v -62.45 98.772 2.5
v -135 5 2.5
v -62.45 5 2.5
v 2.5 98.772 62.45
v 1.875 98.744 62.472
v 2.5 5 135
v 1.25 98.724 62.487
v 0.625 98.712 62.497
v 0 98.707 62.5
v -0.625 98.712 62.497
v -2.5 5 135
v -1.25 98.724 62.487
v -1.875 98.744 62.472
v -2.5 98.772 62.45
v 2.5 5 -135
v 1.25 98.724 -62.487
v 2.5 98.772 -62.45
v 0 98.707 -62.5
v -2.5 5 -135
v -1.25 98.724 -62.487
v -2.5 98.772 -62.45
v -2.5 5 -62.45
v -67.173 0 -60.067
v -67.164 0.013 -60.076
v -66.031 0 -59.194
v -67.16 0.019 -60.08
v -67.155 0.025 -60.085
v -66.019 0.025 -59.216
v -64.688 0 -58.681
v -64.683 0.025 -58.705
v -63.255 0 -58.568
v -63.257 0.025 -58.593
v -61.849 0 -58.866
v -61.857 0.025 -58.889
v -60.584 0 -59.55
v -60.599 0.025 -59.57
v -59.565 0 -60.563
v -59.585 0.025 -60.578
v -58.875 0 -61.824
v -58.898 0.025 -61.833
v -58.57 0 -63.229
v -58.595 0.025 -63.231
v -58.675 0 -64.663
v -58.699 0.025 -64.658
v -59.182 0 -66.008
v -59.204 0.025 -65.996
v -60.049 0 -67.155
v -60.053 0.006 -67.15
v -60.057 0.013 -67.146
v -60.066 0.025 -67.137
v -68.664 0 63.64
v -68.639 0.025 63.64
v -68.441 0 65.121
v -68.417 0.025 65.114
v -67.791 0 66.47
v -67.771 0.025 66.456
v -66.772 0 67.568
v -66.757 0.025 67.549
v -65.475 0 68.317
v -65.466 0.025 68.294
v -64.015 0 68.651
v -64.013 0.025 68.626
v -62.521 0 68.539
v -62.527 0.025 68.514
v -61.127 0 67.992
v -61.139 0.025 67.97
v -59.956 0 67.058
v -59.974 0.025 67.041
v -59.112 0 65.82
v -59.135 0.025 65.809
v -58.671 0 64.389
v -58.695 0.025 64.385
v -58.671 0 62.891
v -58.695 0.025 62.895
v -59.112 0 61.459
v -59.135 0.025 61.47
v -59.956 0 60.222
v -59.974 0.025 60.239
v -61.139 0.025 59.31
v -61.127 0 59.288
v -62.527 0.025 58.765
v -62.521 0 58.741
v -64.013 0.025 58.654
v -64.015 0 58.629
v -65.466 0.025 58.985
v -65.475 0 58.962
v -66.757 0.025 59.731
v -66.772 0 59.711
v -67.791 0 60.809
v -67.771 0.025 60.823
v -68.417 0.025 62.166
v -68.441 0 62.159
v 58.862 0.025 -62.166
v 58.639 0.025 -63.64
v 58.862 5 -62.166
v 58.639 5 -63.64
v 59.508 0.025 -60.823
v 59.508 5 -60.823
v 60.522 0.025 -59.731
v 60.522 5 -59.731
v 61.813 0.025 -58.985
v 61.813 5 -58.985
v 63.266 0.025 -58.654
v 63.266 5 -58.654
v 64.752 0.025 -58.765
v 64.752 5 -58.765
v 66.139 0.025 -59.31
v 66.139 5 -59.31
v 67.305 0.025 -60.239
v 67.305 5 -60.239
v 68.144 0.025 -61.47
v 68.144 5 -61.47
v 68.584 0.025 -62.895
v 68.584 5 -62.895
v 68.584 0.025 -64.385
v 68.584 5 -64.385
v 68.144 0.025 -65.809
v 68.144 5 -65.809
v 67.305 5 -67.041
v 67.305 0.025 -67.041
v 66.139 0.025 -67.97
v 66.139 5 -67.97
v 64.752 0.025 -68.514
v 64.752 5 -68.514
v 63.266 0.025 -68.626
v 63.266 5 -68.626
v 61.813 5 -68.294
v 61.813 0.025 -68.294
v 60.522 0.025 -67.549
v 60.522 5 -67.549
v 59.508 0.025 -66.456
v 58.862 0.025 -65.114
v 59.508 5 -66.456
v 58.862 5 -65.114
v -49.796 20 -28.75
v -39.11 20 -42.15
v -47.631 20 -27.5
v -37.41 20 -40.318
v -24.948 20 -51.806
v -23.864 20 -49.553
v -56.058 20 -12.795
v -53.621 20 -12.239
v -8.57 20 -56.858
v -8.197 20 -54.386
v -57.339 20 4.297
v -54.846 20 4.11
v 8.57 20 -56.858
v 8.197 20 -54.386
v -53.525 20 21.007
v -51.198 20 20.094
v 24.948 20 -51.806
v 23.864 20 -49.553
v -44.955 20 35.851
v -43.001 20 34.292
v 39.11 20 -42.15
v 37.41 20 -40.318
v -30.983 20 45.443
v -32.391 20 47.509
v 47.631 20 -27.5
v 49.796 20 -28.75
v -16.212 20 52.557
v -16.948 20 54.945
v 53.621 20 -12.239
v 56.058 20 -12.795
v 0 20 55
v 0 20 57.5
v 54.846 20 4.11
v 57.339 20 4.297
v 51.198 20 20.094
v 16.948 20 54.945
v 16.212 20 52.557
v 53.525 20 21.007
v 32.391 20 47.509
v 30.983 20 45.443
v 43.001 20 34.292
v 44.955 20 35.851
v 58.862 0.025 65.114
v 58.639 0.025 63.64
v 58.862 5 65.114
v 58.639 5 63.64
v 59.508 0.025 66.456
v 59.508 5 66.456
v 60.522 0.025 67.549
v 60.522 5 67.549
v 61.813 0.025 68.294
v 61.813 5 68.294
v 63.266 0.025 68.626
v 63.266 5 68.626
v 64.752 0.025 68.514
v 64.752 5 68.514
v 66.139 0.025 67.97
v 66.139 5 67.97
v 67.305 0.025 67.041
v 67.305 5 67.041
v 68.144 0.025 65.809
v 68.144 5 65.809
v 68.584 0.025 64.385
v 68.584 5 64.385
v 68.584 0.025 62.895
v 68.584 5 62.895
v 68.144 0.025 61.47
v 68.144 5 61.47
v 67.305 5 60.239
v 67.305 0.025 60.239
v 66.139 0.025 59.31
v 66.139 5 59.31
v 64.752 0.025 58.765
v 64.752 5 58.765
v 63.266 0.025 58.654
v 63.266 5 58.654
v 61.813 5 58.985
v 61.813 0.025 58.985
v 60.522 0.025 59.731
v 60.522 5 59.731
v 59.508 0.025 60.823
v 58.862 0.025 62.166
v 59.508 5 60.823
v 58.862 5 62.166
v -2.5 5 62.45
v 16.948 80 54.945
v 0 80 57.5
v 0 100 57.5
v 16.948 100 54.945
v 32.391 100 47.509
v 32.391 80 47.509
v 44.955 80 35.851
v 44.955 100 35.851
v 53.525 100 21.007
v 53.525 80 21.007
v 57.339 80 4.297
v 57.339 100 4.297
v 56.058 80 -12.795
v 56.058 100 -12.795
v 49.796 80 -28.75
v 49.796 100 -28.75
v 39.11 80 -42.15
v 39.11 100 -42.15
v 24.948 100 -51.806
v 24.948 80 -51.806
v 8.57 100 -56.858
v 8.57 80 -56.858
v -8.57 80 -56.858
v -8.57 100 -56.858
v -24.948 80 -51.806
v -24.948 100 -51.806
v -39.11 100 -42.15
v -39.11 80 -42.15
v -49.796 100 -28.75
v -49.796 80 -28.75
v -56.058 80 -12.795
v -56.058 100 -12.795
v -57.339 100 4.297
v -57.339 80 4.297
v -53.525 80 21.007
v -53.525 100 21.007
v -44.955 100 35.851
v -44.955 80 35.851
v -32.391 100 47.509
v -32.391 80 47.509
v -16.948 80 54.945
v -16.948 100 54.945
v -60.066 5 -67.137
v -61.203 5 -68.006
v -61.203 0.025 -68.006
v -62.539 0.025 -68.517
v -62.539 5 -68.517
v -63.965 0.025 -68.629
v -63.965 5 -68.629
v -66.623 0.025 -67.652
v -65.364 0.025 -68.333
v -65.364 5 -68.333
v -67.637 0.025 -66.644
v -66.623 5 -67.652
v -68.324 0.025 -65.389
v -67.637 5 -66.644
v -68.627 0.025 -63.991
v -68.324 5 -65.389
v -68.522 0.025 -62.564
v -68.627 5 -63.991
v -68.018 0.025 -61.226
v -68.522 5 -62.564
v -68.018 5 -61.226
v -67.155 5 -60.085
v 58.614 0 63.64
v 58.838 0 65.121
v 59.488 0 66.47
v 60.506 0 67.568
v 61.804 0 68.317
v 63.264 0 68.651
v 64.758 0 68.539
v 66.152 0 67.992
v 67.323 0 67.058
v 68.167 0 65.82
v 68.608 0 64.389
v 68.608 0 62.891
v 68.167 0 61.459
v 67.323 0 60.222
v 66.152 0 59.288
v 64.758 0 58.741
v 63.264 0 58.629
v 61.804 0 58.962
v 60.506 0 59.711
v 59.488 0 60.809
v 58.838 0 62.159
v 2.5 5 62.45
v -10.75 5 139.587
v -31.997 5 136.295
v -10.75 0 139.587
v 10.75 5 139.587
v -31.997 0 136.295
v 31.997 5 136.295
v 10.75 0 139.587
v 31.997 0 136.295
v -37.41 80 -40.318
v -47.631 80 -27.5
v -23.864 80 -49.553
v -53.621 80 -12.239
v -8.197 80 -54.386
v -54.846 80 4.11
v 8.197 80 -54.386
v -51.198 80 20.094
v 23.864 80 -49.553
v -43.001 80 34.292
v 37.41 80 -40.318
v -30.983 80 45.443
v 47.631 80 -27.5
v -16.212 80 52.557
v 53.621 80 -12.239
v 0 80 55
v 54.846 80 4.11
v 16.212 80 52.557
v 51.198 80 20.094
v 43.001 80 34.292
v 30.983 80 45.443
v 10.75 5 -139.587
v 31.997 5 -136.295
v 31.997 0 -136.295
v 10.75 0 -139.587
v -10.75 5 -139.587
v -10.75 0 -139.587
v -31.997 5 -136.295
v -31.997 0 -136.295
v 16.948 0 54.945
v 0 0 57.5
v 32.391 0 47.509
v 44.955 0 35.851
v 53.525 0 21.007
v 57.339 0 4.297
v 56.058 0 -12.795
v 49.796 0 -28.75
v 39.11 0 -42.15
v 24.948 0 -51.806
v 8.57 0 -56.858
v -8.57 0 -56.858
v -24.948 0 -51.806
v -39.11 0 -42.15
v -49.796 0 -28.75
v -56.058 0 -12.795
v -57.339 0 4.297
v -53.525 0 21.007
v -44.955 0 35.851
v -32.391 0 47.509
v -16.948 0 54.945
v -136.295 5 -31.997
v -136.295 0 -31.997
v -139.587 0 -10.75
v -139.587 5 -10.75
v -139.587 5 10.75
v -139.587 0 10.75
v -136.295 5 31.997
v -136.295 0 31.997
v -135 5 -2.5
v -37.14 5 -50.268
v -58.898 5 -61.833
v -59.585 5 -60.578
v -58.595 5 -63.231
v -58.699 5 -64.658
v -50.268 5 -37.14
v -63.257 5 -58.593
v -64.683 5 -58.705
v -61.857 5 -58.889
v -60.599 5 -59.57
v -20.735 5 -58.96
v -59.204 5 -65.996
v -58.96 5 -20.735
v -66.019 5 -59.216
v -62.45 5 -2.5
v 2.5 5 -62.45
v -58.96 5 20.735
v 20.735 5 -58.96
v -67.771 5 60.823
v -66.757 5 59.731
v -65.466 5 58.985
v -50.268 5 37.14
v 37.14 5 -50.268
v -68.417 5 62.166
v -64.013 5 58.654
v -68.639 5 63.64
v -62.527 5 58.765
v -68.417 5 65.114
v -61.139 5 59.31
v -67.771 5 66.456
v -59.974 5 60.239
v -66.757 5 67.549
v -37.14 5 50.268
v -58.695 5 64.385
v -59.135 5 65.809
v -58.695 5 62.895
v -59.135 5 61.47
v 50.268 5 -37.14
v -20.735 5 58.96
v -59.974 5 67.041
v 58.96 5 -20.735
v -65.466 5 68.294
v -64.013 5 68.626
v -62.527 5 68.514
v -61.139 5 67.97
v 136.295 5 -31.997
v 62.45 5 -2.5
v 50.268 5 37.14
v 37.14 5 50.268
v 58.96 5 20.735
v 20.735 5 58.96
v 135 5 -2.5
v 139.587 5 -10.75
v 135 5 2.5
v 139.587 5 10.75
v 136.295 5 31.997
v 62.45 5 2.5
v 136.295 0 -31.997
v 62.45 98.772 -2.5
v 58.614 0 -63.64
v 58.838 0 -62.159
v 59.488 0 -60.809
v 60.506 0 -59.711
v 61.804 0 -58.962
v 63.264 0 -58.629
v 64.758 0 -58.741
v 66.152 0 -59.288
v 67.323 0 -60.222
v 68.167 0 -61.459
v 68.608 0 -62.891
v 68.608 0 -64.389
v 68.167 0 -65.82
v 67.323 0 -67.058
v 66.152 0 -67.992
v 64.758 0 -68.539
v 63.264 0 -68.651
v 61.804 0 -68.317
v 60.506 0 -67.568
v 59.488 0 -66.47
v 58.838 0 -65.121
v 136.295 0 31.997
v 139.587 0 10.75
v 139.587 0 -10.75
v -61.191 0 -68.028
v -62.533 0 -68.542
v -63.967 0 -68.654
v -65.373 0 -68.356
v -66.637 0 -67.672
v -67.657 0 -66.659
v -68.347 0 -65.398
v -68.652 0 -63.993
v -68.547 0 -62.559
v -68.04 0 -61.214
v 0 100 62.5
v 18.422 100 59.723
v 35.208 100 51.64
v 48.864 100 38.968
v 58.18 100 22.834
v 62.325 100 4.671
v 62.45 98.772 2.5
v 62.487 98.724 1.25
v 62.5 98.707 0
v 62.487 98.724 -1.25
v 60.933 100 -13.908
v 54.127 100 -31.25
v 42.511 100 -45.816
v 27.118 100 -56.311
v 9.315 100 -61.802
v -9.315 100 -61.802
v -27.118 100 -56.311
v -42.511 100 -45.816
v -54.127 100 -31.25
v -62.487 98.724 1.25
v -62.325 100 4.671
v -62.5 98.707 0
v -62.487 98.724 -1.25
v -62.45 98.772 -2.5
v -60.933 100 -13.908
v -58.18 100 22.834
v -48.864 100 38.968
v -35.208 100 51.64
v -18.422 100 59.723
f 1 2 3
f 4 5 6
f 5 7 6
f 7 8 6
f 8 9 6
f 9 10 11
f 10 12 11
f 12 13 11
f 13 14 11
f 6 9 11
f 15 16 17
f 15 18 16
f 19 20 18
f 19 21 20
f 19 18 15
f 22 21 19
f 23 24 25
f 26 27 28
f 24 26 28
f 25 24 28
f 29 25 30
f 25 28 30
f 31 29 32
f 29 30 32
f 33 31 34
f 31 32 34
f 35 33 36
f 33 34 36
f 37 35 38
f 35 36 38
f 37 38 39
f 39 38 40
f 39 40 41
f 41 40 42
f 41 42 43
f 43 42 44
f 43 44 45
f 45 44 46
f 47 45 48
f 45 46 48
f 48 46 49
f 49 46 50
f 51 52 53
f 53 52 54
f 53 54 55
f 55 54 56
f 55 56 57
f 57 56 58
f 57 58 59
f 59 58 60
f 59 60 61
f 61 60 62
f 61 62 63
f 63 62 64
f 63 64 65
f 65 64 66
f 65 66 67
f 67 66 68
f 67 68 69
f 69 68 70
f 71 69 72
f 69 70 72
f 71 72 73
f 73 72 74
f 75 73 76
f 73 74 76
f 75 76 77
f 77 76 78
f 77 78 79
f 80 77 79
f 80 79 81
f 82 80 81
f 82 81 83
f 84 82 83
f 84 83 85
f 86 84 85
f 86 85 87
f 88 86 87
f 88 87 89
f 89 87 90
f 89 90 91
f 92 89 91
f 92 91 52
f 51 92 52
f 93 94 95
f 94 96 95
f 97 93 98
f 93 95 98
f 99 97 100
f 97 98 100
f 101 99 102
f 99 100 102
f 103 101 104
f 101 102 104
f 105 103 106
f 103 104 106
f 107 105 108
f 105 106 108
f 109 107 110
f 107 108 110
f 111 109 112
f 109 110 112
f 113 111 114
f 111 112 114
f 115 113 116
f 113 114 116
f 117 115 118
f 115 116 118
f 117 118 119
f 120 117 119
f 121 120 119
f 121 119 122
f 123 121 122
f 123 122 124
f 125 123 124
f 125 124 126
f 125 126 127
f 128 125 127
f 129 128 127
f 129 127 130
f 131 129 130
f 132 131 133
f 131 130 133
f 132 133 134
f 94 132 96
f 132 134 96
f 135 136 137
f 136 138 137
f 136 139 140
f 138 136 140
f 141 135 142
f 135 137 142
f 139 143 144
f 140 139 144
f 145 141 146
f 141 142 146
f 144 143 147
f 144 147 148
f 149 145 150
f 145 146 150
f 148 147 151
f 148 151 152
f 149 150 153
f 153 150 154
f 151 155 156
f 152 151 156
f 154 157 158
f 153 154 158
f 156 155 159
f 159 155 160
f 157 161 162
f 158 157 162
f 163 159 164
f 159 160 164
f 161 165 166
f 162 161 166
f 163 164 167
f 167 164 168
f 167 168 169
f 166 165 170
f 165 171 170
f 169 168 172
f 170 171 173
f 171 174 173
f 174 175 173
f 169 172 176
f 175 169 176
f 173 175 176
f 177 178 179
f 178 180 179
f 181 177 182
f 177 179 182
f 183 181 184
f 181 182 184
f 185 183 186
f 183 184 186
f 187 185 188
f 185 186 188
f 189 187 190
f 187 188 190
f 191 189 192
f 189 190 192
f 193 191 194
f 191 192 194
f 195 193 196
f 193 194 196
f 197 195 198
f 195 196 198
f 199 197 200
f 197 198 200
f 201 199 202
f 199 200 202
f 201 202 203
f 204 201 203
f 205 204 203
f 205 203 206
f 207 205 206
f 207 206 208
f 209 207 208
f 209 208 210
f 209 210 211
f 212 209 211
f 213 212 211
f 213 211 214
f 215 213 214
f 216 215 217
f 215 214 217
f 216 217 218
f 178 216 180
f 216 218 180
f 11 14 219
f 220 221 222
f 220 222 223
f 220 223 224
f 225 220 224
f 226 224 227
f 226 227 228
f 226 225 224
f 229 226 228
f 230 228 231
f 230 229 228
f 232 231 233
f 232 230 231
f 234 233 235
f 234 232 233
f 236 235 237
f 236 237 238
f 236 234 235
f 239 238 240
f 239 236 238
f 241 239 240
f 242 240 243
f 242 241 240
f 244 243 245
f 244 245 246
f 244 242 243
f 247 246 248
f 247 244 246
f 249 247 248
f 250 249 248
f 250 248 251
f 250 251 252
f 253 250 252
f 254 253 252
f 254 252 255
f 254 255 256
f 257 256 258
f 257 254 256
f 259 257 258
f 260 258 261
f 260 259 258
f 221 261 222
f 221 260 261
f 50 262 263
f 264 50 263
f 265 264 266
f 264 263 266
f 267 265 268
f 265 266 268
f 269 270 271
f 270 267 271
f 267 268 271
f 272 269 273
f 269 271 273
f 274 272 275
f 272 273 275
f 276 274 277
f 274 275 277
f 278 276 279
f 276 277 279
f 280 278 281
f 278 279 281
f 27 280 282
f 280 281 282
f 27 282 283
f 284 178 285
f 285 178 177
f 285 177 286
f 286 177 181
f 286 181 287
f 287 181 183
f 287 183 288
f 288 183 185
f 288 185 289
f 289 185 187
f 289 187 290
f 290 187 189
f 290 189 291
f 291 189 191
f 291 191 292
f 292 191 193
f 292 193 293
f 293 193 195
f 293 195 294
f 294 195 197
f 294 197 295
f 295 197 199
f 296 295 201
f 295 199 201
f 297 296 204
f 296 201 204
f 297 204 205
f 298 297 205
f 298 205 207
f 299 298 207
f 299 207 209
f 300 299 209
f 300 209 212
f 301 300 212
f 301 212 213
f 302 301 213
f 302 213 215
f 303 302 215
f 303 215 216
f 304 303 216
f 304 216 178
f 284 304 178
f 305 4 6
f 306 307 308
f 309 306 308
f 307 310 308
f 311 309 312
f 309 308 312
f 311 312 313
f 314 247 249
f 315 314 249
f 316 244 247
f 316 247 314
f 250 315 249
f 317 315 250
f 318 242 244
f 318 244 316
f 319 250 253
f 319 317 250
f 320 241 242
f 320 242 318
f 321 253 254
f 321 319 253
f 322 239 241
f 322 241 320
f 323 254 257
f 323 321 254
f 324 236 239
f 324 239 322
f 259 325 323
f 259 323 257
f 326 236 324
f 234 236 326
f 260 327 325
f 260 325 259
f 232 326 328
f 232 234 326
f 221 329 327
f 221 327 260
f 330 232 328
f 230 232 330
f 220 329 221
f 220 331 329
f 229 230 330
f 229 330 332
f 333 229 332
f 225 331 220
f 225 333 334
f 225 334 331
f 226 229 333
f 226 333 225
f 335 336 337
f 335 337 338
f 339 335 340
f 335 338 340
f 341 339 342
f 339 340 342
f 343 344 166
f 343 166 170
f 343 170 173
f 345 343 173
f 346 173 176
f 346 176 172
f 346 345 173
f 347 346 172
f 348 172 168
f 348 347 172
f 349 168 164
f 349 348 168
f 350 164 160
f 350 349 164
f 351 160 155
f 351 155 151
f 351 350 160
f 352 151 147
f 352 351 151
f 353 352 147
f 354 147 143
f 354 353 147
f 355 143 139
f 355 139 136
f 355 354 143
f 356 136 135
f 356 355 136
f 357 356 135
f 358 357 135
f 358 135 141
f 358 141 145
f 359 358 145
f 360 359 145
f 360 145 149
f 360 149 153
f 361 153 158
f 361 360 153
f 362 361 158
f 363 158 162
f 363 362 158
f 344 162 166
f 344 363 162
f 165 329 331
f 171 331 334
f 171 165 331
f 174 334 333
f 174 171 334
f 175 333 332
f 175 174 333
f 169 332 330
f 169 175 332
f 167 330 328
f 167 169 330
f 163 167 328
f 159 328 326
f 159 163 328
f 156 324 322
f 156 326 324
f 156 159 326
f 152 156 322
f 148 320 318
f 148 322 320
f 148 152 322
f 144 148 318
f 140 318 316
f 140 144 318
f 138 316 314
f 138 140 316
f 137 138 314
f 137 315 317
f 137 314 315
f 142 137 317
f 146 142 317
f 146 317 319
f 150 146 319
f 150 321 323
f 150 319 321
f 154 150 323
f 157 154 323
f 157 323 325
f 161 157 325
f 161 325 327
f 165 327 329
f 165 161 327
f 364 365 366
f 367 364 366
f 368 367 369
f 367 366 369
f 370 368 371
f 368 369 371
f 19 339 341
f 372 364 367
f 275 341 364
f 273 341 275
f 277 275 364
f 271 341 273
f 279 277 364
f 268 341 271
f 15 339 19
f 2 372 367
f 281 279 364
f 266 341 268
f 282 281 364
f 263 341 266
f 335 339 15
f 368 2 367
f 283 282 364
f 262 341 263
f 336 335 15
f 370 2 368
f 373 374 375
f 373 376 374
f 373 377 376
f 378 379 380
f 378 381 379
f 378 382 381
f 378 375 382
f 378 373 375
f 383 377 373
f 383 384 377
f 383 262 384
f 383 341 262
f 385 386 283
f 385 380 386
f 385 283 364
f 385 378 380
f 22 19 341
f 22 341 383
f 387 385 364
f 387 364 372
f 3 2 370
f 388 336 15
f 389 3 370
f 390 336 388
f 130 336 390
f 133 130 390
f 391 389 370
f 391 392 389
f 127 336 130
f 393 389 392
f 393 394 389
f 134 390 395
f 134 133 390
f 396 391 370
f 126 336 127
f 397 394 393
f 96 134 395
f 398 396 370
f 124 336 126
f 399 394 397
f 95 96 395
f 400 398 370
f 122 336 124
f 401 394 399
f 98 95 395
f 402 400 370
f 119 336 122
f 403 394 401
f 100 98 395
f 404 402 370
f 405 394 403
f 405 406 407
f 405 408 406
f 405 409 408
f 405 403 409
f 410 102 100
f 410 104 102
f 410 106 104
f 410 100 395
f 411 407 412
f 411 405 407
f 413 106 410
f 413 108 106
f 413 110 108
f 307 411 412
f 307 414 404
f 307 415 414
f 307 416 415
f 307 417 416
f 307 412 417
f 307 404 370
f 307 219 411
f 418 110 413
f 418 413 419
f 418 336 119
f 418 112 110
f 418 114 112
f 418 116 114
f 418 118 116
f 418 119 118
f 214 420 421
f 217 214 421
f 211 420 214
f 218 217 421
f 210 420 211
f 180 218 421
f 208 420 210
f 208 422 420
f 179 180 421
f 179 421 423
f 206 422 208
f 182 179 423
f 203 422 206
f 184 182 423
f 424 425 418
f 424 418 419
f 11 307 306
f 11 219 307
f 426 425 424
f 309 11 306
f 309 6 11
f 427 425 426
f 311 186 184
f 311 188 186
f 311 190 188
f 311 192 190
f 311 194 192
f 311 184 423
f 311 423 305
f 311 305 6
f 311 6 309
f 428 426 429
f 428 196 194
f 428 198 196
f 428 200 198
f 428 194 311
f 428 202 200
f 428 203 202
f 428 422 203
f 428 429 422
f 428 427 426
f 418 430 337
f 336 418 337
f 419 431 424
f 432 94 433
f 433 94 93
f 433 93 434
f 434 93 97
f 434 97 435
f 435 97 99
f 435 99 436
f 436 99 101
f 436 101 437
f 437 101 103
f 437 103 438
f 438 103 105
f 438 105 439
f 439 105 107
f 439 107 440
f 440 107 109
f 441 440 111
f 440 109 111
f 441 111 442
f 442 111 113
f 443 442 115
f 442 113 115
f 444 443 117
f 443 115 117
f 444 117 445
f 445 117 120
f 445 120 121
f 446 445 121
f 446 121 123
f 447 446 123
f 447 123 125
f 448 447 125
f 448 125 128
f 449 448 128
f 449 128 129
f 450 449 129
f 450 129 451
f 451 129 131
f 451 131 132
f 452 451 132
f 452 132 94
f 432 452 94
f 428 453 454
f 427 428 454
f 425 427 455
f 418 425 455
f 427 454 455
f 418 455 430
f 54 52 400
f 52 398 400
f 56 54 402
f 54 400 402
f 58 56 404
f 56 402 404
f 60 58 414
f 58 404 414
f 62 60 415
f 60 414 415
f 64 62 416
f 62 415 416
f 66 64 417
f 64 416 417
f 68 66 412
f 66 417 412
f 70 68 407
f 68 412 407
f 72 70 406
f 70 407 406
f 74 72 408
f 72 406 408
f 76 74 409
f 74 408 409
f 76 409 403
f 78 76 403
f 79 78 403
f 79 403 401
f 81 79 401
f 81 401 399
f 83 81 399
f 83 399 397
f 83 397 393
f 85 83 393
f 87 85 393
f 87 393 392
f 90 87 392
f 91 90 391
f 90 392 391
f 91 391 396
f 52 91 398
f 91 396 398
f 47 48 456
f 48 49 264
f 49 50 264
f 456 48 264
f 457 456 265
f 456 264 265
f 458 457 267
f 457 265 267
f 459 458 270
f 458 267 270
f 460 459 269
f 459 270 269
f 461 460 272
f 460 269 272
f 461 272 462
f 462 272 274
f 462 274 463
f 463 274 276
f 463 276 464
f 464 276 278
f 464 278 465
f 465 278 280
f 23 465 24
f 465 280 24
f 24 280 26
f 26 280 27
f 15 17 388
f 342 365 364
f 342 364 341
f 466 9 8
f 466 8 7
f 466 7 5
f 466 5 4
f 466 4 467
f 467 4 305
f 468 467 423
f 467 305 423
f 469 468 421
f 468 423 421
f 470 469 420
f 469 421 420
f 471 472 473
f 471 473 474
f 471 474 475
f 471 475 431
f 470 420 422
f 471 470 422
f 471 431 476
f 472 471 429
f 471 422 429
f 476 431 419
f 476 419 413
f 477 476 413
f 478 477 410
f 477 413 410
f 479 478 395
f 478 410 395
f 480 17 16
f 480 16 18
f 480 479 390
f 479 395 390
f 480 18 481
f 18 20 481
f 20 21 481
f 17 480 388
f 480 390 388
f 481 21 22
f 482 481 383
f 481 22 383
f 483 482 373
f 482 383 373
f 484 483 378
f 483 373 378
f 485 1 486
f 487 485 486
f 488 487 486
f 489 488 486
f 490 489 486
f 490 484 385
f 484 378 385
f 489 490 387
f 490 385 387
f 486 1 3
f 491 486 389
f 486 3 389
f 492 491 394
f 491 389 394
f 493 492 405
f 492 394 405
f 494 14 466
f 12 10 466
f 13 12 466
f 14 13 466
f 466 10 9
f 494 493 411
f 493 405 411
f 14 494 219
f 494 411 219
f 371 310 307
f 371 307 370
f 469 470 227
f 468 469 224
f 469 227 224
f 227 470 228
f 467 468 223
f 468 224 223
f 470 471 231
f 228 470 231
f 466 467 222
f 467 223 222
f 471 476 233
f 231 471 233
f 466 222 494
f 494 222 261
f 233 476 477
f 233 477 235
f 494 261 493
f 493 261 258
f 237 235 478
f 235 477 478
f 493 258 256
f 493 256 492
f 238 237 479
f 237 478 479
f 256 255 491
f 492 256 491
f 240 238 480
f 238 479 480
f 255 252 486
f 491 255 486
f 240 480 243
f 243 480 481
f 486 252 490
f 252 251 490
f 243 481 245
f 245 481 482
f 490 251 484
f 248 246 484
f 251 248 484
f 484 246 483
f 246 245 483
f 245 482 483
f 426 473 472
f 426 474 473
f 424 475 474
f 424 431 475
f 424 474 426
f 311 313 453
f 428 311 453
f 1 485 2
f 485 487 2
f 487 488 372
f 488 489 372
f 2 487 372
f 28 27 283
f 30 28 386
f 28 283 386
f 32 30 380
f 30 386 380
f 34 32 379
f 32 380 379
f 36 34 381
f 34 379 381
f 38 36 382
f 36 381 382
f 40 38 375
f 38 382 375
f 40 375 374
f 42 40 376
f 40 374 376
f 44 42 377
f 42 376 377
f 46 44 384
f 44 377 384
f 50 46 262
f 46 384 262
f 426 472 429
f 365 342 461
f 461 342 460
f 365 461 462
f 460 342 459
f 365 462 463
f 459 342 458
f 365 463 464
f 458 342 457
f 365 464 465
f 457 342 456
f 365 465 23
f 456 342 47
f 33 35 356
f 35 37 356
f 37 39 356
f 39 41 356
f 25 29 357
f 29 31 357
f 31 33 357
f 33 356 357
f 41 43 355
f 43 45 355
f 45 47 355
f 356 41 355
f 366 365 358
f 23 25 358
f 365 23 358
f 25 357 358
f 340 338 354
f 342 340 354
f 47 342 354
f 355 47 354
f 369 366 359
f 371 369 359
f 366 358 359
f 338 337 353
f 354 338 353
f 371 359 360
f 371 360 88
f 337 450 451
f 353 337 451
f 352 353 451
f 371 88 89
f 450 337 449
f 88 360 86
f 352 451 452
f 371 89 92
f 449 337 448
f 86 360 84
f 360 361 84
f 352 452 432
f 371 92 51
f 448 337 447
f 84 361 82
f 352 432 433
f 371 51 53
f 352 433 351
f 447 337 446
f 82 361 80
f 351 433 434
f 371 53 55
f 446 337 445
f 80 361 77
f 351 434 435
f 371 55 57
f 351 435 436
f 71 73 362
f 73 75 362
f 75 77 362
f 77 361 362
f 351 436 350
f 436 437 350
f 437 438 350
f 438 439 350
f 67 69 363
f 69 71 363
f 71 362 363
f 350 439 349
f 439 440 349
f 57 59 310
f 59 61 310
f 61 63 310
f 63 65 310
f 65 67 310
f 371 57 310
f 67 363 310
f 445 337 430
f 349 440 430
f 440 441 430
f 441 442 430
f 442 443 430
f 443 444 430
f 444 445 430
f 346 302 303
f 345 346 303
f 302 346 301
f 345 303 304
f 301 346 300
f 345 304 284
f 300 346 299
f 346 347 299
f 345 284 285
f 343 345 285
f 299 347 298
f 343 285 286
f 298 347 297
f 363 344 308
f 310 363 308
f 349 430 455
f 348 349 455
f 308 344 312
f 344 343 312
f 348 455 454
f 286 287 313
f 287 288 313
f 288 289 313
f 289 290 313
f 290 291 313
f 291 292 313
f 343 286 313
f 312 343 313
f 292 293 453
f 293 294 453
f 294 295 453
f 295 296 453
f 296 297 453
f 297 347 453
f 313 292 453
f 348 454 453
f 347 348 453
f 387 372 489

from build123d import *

# Parameters (mm, degrees)
SKETCH1_R                        = 140
SKETCH1_R_2                      = 62.5
BOSS_EXTRUDE1_DEPTH              = 5
SKETCH1_3_R                      = 62.5
SKETCH1_3_R_2                    = 57.5
SKETCH1_3_R_3                    = 55
BOSS_EXTRUDE2_DEPTH              = 100
SKETCH1_4_R                      = 57.5
SKETCH1_4_R_2                    = 55
CUT_EXTRUDE1_DEPTH               = 20
CUT_EXTRUDE2_START               = -20
SKETCH2_R                        = 57.5
CUT_EXTRUDE2_DEPTH               = 20
F_10_0MM_DOWEL_HOLE1_D           = 10
F_10_0MM_DOWEL_HOLE1_CSINK_D     = 10.05
F_10_0MM_DOWEL_HOLE1_CSINK_ANGLE = 90
CUT_EXTRUDE3_DEPTH               = 5
RIB4_START                       = -2.5
RIB4_DEPTH                       = 5
RIB5_REACH                       = 223.811
SKETCH9_WALL_W                   = 565.734948258
SKETCH9_WALL_H                   = 5
RIB6_REACH                       = 223.811
SKETCH10_WALL_W                  = 565.734948258
SKETCH10_WALL_H                  = 5
RIB7_REACH                       = 223.811
SKETCH11_WALL_W                  = 565.734948258
SKETCH11_WALL_H                  = 5


# Read off the part's stored shape, not the designer's step: Rib4
with BuildPart() as part:
    # Sketch1 → Boss-Extrude1 (new body)
    with BuildSketch(Plane(origin=(0, 0, 0), x_dir=(1, 0, 0), z_dir=(0, 1, 0))):
        with Locations(Location((0, 0, 0), (0, 0, 270))):
            Circle(SKETCH1_R)
        with Locations(Location((0, 0, 0), (0, 0, 270))):
            Circle(SKETCH1_R_2, mode=Mode.SUBTRACT)
    extrude(amount=BOSS_EXTRUDE1_DEPTH)

    # Sketch1<3> → Boss-Extrude2 (add)
    # profile 1 of 2: a face of its own
    with BuildSketch(Plane(origin=(0, 0, 0), x_dir=(1, 0, 0), z_dir=(0, 1, 0))):
        with Locations(Location((0, 0, 0), (0, 0, 270))):
            Circle(SKETCH1_3_R)
        Circle(SKETCH1_3_R_2, mode=Mode.SUBTRACT)
    # profile 2 of 2: a face of its own
    with BuildSketch(Plane(origin=(0, 0, 0), x_dir=(1, 0, 0), z_dir=(0, 1, 0))):
        Circle(SKETCH1_3_R_2)
        with Locations(Location((0, 0, 0), (0, 0, 270))):
            Circle(SKETCH1_3_R_3, mode=Mode.SUBTRACT)
    extrude(amount=BOSS_EXTRUDE2_DEPTH)

    # Sketch1<4> → Cut-Extrude1 (cut)
    with BuildSketch(Plane(origin=(0, 0, 0), x_dir=(1, 0, 0), z_dir=(0, 1, 0))):
        with Locations(Location((0, 0, 0), (0, 0, 270))):
            Circle(SKETCH1_4_R)
        with Locations(Location((0, 0, 0), (0, 0, 270))):
            Circle(SKETCH1_4_R_2, mode=Mode.SUBTRACT)
    extrude(amount=CUT_EXTRUDE1_DEPTH, mode=Mode.SUBTRACT)

    # Sketch2 → Cut-Extrude2 (cut)
    with BuildSketch(Plane(origin=(0, 100, 0), x_dir=(1, 0, 0), z_dir=(0, 1, 0)).offset(CUT_EXTRUDE2_START)):
        with Locations(Location((0, 0, 0), (0, 0, 270))):
            Circle(SKETCH2_R)
    extrude(amount=CUT_EXTRUDE2_DEPTH, mode=Mode.SUBTRACT)

    # Ø10.0mm Dowel Hole1 (through all)
    with Locations(Plane.XZ):
        with Locations((-63.639461911, -63.639758703), (63.639461911, -63.639758703), (63.639461911, 63.639758703), (-63.639461911, 63.639758703), (-63.582280459, -63.582280459)):
            CounterSinkHole(F_10_0MM_DOWEL_HOLE1_D / 2, F_10_0MM_DOWEL_HOLE1_CSINK_D / 2, counter_sink_angle=F_10_0MM_DOWEL_HOLE1_CSINK_ANGLE)

    # Sketch8 → Cut-Extrude3 (cut)
    with BuildSketch(Plane(origin=(0, 0, 0), x_dir=(1, 0, 0), z_dir=(0, 1, 0))):
        with BuildLine():
            ThreePointArc((31.996881471, 136.294532451), (136.294532451, 136.294532451), (136.294532451, 31.996881471))
            Line((136.294532451, 31.996881471), (31.996881471, 136.294532451))
        make_face()
        with BuildLine():
            Line((31.996881471, -136.294532451), (136.294532451, -31.996881471))
            ThreePointArc((136.294532451, -31.996881471), (136.294532451, -136.294532451), (31.996881471, -136.294532451))
        make_face()
        with BuildLine():
            Line((-31.996881471, -136.294532451), (-84.145706961, -84.145706961))
            Line((-84.145706961, -84.145706961), (-136.294532451, -31.996881471))
            ThreePointArc((-136.294532451, -31.996881471), (-136.294532451, -136.294532451), (-31.996881471, -136.294532451))
        make_face()
        with BuildLine():
            Line((-136.294532451, 31.996881471), (-31.996881471, 136.294532451))
            ThreePointArc((-31.996881471, 136.294532451), (-136.294532451, 136.294532451), (-136.294532451, 31.996881471))
        make_face()
    extrude(amount=CUT_EXTRUDE3_DEPTH, mode=Mode.SUBTRACT)

    # Rib4 outline → Rib4 (add)
    with BuildSketch(Plane.XY.offset(RIB4_START)):
        Polygon((-61.5, 100), (-62.449979984, 98.772134715), (-135, 5), (-61, 5), (-61, 100), align=None)
    extrude(amount=RIB4_DEPTH)

    # Sketch9 wall → Rib5 (add, up to next)
    with BuildSketch(Plane(origin=(98.25, 52.5, 0), x_dir=(0.611921285633, -0.790918668505, 0), z_dir=(0.790918668505, 0.611921285633, 0)), mode=Mode.PRIVATE) as rib5_sk1:
        Rectangle(SKETCH9_WALL_W, SKETCH9_WALL_H)
    rib5_tool1 = extrude(rib5_sk1.sketch, amount=-RIB5_REACH, mode=Mode.PRIVATE) - part.part
    add(rib5_tool1.solids().sort_by_distance((98.25, 52.5, 0))[0])

    # Sketch10 wall → Rib6 (add, up to next)
    with BuildSketch(Plane(origin=(0, 52.5, 98.25), x_dir=(0, -0.790918668505, 0.611921285633), z_dir=(0, -0.611921285633, -0.790918668505)), mode=Mode.PRIVATE) as rib6_sk1:
        Rectangle(SKETCH10_WALL_W, SKETCH10_WALL_H)
    rib6_tool1 = extrude(rib6_sk1.sketch, amount=RIB6_REACH, mode=Mode.PRIVATE) - part.part
    add(rib6_tool1.solids().sort_by_distance((0, 52.5, 98.25))[0])

    # Sketch11 wall → Rib7 (add, up to next)
    with BuildSketch(Plane(origin=(0, 52.5, -98.25), x_dir=(0, -0.790918668505, -0.611921285633), z_dir=(0, 0.611921285633, -0.790918668505)), mode=Mode.PRIVATE) as rib7_sk1:
        Rectangle(SKETCH11_WALL_W, SKETCH11_WALL_H)
    rib7_tool1 = extrude(rib7_sk1.sketch, amount=-RIB7_REACH, mode=Mode.PRIVATE) - part.part
    add(rib7_tool1.solids().sort_by_distance((0, 52.5, -98.25))[0])


solid = part.part
